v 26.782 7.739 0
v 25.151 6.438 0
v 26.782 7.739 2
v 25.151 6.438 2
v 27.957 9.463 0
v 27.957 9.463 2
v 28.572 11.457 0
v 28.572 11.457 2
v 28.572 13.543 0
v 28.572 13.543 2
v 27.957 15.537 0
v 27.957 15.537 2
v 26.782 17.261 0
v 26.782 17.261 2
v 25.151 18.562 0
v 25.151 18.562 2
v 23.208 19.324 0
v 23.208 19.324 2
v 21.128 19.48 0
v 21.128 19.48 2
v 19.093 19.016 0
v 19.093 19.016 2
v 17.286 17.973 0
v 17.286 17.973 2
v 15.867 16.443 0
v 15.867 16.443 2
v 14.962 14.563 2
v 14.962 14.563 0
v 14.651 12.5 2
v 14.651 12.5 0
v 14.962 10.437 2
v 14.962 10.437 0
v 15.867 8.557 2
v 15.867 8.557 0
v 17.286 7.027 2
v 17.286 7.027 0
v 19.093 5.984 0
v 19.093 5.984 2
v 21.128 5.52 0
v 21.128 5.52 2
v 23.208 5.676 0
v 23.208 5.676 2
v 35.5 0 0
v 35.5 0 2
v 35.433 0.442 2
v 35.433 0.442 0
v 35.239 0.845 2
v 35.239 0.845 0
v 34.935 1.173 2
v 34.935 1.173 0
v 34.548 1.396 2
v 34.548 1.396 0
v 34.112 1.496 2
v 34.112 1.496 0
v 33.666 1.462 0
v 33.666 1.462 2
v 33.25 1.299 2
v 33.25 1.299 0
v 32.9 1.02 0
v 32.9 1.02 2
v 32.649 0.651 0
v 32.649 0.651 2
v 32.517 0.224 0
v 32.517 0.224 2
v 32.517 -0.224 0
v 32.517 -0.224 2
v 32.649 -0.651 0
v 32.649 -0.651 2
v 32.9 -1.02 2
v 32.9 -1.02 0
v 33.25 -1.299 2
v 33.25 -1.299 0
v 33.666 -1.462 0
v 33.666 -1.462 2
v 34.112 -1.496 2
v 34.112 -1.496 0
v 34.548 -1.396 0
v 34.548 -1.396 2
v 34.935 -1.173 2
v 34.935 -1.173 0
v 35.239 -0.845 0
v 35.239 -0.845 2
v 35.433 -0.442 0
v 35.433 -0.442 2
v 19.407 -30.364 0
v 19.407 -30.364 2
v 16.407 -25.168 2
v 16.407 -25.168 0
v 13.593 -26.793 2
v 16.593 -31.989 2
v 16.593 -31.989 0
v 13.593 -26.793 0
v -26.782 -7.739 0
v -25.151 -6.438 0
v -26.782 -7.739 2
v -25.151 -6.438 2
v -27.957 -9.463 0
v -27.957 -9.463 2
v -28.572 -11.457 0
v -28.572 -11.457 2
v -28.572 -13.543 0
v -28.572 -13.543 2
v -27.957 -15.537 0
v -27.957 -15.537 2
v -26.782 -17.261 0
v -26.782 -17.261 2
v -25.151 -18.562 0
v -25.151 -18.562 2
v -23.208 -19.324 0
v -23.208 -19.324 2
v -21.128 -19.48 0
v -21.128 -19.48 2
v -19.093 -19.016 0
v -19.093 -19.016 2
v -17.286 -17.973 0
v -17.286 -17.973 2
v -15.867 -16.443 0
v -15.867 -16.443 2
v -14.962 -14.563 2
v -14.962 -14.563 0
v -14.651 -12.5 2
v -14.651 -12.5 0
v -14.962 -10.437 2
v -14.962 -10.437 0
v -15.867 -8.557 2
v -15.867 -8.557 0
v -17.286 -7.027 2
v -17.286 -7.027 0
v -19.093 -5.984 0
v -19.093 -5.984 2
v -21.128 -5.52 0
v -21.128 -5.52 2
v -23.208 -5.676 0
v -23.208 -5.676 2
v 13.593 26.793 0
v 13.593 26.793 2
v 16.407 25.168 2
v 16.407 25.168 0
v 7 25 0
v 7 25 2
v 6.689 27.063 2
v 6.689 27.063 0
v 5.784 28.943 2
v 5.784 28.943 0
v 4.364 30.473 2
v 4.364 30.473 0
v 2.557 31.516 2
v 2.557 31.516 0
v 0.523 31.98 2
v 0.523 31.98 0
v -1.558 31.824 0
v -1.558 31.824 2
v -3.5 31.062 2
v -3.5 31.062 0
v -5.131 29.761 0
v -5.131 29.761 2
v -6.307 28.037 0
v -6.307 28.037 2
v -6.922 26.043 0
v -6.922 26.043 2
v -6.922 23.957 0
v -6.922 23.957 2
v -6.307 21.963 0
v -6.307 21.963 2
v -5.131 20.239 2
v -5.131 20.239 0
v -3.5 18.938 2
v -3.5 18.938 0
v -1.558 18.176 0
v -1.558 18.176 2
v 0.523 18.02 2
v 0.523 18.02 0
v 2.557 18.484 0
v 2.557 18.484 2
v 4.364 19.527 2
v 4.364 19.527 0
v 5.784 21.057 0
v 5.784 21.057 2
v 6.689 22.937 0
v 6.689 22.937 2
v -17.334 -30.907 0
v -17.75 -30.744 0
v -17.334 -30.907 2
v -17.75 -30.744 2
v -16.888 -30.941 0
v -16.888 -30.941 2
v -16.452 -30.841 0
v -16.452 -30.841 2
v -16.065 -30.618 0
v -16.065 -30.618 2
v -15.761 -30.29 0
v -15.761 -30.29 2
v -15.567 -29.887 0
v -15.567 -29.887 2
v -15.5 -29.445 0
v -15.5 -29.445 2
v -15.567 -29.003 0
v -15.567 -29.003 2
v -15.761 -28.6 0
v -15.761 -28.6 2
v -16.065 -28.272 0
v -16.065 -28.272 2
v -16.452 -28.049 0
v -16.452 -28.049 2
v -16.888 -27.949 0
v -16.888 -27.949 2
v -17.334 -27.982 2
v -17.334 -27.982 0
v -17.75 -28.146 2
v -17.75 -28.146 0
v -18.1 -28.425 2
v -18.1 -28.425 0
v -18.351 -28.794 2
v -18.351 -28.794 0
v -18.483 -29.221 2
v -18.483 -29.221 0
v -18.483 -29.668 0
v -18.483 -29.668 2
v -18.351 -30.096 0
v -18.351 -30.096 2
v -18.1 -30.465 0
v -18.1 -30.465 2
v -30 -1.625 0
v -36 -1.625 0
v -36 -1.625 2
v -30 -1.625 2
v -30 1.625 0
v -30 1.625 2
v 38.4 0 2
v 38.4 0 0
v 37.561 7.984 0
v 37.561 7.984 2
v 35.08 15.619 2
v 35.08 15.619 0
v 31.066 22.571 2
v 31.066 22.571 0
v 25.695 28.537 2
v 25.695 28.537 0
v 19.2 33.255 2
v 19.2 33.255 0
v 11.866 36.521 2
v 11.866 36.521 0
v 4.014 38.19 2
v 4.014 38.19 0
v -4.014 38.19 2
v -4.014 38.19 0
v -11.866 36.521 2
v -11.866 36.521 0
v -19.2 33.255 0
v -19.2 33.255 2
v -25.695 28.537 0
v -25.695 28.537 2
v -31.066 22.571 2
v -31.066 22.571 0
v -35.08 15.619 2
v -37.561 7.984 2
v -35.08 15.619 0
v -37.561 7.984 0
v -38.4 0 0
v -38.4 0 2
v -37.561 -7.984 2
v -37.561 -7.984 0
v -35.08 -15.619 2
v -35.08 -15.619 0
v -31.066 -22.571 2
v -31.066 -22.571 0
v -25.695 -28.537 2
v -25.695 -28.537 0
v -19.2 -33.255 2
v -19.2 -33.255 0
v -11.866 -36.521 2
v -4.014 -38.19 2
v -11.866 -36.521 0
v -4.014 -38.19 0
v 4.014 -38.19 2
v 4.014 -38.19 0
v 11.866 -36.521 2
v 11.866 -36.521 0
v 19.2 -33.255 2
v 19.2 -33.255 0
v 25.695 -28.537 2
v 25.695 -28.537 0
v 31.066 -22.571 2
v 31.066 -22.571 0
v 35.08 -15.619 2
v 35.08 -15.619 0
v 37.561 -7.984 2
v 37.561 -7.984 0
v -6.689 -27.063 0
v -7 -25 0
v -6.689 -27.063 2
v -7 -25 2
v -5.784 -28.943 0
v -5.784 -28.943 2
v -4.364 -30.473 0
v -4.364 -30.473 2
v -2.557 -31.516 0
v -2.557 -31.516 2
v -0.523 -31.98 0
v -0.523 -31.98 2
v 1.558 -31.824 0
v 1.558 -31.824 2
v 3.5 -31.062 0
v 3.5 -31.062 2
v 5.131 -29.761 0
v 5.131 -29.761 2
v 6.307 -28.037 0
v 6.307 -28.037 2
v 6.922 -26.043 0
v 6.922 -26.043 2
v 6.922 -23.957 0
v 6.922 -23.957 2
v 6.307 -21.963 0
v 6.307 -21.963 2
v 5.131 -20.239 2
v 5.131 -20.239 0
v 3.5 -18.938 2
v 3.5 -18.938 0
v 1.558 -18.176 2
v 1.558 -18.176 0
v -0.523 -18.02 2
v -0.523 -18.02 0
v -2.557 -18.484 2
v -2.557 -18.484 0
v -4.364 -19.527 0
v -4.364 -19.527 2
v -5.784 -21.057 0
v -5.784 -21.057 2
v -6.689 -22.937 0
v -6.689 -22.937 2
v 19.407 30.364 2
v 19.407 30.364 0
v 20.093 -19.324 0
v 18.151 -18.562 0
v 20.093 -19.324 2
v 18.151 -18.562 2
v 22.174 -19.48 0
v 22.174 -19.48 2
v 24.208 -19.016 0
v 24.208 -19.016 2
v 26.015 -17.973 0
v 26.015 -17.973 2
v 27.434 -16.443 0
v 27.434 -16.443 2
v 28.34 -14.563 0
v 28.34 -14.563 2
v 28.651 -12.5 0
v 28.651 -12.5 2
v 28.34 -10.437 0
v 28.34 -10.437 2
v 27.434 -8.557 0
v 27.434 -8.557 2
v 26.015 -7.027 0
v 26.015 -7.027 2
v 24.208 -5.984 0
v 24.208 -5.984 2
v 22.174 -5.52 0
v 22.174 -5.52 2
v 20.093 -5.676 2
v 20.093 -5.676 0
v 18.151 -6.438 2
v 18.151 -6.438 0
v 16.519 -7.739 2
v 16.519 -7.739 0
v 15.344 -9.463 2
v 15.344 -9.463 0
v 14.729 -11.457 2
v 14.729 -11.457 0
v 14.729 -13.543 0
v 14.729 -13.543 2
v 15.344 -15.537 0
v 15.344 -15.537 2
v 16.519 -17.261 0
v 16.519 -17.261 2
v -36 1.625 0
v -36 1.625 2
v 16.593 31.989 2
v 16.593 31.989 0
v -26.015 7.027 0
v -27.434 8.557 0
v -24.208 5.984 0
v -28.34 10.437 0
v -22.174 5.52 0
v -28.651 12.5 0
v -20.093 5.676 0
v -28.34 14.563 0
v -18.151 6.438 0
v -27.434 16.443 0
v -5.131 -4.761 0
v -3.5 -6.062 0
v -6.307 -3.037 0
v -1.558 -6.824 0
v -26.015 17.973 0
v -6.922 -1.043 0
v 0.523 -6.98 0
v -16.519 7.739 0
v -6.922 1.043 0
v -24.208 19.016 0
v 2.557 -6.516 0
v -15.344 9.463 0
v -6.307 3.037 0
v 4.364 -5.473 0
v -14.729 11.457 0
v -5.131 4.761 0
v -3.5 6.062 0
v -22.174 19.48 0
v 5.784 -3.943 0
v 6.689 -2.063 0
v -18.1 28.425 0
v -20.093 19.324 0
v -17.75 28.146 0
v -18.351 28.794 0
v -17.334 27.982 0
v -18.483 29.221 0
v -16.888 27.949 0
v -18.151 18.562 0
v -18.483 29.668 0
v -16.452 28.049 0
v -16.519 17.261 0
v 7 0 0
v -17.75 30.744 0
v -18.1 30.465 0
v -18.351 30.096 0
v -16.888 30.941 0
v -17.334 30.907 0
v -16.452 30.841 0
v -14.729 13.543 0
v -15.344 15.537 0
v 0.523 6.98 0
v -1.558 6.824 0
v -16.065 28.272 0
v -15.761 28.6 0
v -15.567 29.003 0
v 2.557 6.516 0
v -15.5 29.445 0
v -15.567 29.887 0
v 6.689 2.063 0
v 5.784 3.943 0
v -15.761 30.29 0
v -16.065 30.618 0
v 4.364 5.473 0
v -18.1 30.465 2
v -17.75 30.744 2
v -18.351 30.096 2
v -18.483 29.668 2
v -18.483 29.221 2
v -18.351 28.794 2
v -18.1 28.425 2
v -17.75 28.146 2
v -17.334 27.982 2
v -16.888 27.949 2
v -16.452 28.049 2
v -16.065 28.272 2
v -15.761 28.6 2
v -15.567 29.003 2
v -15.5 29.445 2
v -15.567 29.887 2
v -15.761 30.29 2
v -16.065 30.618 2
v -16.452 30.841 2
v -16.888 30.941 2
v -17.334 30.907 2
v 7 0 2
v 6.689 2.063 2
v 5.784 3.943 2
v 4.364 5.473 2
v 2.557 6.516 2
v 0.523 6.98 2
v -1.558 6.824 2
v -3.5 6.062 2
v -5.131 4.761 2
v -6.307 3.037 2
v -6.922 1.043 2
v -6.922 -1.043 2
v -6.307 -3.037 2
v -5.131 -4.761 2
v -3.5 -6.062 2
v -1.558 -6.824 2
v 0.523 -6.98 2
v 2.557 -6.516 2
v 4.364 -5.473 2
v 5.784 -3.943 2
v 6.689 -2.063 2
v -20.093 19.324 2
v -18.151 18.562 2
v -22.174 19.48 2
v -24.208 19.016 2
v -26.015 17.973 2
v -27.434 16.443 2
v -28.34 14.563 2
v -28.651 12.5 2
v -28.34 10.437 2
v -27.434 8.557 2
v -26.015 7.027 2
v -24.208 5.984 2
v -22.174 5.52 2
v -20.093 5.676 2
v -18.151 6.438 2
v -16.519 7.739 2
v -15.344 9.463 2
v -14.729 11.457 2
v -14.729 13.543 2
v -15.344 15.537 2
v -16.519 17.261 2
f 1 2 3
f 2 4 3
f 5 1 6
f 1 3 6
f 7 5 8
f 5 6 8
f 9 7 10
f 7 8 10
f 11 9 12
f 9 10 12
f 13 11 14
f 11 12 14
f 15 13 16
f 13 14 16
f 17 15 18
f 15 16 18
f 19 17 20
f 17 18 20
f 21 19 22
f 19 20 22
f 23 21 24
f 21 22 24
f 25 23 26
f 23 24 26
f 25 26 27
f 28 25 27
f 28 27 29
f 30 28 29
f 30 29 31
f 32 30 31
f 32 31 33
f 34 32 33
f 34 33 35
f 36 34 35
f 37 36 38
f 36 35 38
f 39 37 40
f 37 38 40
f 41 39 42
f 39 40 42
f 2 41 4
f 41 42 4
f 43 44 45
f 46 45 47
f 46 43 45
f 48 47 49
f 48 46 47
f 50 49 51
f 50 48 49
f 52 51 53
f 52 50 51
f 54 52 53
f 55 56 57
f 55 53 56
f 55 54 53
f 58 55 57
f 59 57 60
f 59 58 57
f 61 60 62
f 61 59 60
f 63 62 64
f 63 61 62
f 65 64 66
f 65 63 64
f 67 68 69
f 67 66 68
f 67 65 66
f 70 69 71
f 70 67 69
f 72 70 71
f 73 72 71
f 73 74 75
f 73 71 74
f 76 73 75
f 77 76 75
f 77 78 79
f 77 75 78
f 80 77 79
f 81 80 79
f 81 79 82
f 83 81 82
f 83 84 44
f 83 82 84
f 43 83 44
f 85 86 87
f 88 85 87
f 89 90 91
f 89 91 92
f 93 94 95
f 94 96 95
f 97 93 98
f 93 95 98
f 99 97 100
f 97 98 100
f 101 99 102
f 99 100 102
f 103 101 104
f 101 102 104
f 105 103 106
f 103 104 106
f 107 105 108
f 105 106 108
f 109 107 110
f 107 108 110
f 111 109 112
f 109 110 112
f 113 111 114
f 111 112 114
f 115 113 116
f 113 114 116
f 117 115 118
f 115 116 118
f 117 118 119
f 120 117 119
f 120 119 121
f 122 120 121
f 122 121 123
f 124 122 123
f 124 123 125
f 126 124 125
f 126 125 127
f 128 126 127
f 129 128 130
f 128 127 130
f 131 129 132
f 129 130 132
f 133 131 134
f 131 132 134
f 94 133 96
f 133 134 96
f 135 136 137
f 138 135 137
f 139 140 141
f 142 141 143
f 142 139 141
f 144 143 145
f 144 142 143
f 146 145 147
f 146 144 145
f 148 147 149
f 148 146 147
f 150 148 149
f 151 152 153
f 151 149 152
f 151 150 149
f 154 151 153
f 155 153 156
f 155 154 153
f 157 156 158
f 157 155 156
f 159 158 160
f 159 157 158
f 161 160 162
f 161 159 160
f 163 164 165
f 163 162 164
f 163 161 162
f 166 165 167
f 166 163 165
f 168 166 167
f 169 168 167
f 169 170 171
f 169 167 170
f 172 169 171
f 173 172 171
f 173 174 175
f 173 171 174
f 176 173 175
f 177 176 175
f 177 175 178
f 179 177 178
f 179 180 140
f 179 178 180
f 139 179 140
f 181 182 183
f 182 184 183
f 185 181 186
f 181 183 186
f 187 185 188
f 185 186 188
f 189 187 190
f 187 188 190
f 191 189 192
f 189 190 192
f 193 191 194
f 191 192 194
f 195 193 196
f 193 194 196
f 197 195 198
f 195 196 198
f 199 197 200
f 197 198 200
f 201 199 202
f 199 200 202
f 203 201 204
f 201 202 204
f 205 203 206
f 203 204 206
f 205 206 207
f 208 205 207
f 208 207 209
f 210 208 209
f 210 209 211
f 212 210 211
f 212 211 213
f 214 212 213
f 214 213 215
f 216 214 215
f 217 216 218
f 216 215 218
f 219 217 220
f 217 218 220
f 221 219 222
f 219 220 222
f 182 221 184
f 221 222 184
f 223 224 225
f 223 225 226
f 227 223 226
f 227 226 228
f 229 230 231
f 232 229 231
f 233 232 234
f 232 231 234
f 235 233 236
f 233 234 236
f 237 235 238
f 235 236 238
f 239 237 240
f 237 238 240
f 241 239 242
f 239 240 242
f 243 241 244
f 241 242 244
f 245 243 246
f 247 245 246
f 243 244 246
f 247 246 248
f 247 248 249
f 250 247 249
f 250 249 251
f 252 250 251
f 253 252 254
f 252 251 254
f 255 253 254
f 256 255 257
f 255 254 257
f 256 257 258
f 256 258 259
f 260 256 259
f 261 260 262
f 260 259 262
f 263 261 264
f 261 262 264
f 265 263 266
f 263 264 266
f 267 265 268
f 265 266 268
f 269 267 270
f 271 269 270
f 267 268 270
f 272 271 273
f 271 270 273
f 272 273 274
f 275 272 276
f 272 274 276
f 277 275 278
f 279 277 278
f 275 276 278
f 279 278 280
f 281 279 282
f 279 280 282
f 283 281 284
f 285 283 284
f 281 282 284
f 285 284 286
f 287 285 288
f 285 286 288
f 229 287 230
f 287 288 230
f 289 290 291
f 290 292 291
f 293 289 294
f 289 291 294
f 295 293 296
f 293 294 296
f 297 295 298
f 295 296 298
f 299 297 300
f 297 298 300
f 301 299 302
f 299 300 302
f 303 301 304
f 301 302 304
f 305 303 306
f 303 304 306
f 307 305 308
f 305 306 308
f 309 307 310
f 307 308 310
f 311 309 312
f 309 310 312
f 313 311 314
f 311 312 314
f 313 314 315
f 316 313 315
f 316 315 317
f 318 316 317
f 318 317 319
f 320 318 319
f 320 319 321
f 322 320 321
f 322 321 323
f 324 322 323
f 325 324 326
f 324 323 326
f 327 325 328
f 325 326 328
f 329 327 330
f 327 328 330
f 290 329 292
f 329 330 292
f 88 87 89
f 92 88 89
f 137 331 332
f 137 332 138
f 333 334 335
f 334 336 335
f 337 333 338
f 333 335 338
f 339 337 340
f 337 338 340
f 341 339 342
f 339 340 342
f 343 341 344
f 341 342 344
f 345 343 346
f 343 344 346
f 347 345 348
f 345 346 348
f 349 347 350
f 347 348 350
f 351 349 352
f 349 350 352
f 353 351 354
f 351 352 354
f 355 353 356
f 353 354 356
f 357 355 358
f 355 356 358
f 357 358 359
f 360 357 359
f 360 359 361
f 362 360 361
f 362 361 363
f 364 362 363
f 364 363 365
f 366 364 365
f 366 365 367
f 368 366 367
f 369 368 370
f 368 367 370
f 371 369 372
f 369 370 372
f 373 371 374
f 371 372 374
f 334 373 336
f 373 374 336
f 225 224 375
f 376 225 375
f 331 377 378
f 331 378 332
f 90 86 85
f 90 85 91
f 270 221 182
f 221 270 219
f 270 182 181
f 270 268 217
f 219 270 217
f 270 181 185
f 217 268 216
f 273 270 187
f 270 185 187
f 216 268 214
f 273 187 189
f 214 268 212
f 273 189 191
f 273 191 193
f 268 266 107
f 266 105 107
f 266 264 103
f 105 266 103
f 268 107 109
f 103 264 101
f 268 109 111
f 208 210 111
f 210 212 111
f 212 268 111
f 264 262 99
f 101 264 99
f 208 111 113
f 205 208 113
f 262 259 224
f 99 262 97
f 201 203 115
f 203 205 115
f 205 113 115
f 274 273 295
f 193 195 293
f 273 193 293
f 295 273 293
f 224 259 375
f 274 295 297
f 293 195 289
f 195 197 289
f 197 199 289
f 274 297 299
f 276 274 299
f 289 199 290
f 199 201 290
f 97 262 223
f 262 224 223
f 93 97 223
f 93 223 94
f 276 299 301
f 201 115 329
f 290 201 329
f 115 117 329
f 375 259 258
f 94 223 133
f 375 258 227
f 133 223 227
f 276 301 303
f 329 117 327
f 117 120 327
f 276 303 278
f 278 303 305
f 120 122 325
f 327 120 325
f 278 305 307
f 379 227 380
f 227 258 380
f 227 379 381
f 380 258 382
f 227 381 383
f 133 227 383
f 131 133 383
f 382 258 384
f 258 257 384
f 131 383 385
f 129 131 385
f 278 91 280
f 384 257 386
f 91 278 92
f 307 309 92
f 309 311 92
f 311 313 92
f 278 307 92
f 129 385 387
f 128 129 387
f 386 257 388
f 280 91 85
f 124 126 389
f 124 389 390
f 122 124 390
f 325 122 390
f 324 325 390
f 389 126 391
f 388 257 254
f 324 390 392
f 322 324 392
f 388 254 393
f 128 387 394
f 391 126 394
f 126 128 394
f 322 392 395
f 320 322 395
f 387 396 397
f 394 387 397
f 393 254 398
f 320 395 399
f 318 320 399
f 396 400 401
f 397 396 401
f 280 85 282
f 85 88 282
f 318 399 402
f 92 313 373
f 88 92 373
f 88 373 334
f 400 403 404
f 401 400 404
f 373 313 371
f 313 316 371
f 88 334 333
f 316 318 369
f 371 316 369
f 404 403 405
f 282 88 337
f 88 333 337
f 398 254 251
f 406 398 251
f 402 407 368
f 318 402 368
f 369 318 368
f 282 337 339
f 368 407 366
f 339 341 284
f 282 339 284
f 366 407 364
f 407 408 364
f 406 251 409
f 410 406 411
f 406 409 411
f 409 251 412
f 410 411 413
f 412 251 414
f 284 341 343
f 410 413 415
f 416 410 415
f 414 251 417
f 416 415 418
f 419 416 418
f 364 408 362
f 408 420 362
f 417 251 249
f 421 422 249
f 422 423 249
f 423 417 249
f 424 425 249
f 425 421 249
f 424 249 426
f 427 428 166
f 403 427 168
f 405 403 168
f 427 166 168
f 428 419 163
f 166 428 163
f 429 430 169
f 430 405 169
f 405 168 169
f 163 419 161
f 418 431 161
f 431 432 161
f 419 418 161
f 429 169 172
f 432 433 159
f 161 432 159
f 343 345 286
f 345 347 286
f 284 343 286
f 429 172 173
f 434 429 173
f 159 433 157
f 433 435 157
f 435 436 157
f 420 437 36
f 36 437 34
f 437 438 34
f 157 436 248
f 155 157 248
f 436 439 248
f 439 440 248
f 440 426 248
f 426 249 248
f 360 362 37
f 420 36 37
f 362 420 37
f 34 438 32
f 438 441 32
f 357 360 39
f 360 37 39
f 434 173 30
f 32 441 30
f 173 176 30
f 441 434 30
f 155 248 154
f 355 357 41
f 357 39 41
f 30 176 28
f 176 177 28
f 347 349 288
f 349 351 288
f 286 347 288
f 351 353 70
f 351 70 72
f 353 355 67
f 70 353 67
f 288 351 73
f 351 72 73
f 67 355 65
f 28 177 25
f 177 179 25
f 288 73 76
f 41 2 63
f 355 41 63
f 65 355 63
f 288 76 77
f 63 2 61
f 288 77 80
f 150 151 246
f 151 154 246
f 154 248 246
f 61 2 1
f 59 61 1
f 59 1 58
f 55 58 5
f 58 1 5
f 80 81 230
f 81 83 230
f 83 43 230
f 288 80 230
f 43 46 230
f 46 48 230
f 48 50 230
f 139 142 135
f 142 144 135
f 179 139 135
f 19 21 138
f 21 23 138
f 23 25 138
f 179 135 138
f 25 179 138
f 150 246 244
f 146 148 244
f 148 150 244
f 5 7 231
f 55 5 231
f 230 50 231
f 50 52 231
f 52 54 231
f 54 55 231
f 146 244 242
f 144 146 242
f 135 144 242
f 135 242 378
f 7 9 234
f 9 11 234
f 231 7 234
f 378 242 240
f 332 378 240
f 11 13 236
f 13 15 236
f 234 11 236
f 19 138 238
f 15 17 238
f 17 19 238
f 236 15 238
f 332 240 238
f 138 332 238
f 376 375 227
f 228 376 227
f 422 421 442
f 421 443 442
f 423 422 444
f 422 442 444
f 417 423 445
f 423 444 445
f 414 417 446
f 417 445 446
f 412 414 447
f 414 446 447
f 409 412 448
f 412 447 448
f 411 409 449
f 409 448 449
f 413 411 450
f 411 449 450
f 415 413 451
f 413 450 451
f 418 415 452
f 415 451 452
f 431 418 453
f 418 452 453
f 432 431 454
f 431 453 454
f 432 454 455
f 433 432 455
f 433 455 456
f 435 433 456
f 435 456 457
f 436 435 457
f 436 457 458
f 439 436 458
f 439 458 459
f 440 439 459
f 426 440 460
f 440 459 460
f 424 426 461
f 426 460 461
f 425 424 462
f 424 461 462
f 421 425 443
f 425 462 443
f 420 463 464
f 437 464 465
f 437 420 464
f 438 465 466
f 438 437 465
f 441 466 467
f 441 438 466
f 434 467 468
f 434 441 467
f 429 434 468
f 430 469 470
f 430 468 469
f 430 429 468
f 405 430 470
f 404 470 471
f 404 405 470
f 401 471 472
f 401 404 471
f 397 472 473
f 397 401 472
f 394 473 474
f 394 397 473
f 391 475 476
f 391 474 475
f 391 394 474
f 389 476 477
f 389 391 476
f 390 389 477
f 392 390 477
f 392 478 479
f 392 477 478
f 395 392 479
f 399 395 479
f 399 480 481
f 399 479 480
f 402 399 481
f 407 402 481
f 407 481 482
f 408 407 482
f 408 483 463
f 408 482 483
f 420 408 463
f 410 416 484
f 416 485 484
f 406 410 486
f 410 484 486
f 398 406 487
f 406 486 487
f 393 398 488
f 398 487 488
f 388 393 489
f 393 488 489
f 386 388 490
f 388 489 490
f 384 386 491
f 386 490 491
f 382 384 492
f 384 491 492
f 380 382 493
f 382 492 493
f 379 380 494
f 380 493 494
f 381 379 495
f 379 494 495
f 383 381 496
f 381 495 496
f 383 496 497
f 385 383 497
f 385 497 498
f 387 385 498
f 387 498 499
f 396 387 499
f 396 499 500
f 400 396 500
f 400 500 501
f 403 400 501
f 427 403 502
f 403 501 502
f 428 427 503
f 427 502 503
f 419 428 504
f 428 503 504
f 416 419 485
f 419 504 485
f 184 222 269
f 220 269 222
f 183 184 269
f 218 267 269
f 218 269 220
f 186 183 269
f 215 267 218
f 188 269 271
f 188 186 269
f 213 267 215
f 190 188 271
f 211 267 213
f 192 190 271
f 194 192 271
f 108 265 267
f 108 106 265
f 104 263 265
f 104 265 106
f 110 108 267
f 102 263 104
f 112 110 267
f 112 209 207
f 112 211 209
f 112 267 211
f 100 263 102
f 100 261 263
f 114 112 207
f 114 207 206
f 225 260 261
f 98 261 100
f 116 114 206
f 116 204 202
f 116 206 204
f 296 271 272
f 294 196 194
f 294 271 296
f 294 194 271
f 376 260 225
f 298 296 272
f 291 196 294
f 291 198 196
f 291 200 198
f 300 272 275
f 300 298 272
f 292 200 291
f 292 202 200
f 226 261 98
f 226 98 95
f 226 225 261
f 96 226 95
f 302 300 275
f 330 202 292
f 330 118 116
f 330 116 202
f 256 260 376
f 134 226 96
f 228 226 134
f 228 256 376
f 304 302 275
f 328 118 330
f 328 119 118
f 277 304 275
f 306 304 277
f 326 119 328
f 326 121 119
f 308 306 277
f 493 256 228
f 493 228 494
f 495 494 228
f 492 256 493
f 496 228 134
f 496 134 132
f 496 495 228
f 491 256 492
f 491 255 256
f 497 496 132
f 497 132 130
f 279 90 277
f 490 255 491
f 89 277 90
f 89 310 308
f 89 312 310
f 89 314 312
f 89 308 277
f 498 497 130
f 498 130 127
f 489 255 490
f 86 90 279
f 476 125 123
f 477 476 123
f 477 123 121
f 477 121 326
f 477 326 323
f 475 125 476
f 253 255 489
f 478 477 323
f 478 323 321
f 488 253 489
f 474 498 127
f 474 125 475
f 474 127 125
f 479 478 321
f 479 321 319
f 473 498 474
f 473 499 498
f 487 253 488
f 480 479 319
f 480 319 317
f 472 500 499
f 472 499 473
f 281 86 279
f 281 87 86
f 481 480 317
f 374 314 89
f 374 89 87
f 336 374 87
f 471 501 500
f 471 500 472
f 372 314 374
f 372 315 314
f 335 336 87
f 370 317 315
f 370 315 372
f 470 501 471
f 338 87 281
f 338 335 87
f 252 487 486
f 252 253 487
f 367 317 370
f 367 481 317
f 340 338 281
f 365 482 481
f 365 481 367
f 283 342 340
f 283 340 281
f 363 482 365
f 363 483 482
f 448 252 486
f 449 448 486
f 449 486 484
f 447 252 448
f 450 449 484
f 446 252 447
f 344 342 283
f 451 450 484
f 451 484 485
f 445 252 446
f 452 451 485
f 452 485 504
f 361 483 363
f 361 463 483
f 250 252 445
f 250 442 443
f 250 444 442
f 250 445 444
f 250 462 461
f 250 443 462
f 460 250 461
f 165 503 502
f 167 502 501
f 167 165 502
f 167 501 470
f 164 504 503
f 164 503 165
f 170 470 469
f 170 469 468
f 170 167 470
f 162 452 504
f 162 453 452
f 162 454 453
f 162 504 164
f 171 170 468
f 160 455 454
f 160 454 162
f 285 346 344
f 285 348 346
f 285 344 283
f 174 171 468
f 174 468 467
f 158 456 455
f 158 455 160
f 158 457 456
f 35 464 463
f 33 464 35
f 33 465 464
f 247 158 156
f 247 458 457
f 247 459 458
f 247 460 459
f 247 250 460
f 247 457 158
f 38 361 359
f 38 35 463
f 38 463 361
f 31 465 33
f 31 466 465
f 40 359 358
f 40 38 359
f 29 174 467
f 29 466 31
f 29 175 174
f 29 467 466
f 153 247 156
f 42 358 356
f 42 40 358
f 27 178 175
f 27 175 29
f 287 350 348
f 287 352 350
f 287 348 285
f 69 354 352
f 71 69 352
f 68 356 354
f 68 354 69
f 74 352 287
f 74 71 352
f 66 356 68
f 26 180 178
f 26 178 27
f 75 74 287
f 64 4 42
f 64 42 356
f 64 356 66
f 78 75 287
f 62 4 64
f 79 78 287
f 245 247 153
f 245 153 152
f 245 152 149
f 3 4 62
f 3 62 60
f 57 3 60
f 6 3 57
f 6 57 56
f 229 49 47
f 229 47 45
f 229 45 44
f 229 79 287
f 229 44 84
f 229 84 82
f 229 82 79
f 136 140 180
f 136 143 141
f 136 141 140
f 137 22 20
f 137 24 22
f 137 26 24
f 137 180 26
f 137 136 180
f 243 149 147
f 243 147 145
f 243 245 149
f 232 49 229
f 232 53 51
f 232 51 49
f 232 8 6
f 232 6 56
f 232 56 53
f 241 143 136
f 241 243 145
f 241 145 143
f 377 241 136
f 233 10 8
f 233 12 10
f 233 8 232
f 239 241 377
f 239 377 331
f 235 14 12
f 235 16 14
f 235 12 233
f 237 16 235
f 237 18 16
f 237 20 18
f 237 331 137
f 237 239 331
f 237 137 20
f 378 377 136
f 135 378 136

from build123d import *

# Parameters (mm, degrees)
CYLINDER_R            = 38.4
CYLINDER_DEPTH        = 2
SKETCH_R              = 1.5
POCKET_DEPTH          = 217.261029
POCKET_DEPTH_BACK     = 219.261029
POLARPATTERN_COUNT    = 3
SKETCH001_R           = 7
POCKET001_DEPTH       = 0.001
POCKET001_DEPTH_BACK  = 2.001
SKETCH002_R           = 7
POCKET002_DEPTH       = 217.261029
POCKET002_DEPTH_BACK  = 219.261029
POLARPATTERN001_COUNT = 6
SKETCH003_W           = 6
SKETCH003_H           = 3.25
POCKET003_DEPTH       = 217.261029
POCKET003_DEPTH_BACK  = 219.261029
POLARPATTERN002_COUNT = 3


with BuildPart() as part:
    # Cylinder → Cylinder (new body)
    with BuildSketch(Plane.XY):
        Circle(CYLINDER_R)
    extrude(amount=CYLINDER_DEPTH)

    # Sketch → Pocket (cut, two sides)
    with BuildSketch(Plane(origin=(34, 0, 0), x_dir=(1, 0, 0), z_dir=(0, 0, 1))) as pocket_sk:
        Circle(SKETCH_R)
    pocket = extrude(amount=-POCKET_DEPTH, mode=Mode.SUBTRACT) + extrude(pocket_sk.sketch, amount=POCKET_DEPTH_BACK, mode=Mode.SUBTRACT)

    # PolarPattern: Pocket ×3 about axis
    polarpattern_axis = Axis((0, 0, 0), (0, 0, 1))
    for i in range(1, POLARPATTERN_COUNT):
        add(pocket.rotate(polarpattern_axis, i * 360 / POLARPATTERN_COUNT), mode=Mode.SUBTRACT)

    # Sketch001 → Pocket001 (cut, two sides)
    with BuildSketch(Plane.XY) as pocket001_sk:
        Circle(SKETCH001_R)
    extrude(amount=-POCKET001_DEPTH, mode=Mode.SUBTRACT)
    extrude(pocket001_sk.sketch, amount=POCKET001_DEPTH_BACK, mode=Mode.SUBTRACT)

    # Sketch002 → Pocket002 (cut, two sides)
    with BuildSketch(Plane(origin=(0, 25, 0), x_dir=(1, 0, 0), z_dir=(0, 0, 1))) as pocket002_sk:
        Circle(SKETCH002_R)
    pocket002 = extrude(amount=-POCKET002_DEPTH, mode=Mode.SUBTRACT) + extrude(pocket002_sk.sketch, amount=POCKET002_DEPTH_BACK, mode=Mode.SUBTRACT)

    # PolarPattern001: Pocket002 ×6 about axis
    polarpattern001_axis = Axis((0, 0, 0), (0, 0, 1))
    for i in range(1, POLARPATTERN001_COUNT):
        add(pocket002.rotate(polarpattern001_axis, i * 360 / POLARPATTERN001_COUNT), mode=Mode.SUBTRACT)

    # Sketch003 → Pocket003 (cut, two sides)
    with BuildSketch(Plane(origin=(-33, 0, 0), x_dir=(1, 0, 0), z_dir=(0, 0, 1))) as pocket003_sk:
        Rectangle(SKETCH003_W, SKETCH003_H)
    pocket003 = extrude(amount=-POCKET003_DEPTH, mode=Mode.SUBTRACT) + extrude(pocket003_sk.sketch, amount=POCKET003_DEPTH_BACK, mode=Mode.SUBTRACT)

    # PolarPattern002: Pocket003 ×3 about axis
    polarpattern002_axis = Axis((0, 0, 0), (0, 0, 1))
    for i in range(1, POLARPATTERN002_COUNT):
        add(pocket003.rotate(polarpattern002_axis, i * 360 / POLARPATTERN002_COUNT), mode=Mode.SUBTRACT)


solid = part.part
